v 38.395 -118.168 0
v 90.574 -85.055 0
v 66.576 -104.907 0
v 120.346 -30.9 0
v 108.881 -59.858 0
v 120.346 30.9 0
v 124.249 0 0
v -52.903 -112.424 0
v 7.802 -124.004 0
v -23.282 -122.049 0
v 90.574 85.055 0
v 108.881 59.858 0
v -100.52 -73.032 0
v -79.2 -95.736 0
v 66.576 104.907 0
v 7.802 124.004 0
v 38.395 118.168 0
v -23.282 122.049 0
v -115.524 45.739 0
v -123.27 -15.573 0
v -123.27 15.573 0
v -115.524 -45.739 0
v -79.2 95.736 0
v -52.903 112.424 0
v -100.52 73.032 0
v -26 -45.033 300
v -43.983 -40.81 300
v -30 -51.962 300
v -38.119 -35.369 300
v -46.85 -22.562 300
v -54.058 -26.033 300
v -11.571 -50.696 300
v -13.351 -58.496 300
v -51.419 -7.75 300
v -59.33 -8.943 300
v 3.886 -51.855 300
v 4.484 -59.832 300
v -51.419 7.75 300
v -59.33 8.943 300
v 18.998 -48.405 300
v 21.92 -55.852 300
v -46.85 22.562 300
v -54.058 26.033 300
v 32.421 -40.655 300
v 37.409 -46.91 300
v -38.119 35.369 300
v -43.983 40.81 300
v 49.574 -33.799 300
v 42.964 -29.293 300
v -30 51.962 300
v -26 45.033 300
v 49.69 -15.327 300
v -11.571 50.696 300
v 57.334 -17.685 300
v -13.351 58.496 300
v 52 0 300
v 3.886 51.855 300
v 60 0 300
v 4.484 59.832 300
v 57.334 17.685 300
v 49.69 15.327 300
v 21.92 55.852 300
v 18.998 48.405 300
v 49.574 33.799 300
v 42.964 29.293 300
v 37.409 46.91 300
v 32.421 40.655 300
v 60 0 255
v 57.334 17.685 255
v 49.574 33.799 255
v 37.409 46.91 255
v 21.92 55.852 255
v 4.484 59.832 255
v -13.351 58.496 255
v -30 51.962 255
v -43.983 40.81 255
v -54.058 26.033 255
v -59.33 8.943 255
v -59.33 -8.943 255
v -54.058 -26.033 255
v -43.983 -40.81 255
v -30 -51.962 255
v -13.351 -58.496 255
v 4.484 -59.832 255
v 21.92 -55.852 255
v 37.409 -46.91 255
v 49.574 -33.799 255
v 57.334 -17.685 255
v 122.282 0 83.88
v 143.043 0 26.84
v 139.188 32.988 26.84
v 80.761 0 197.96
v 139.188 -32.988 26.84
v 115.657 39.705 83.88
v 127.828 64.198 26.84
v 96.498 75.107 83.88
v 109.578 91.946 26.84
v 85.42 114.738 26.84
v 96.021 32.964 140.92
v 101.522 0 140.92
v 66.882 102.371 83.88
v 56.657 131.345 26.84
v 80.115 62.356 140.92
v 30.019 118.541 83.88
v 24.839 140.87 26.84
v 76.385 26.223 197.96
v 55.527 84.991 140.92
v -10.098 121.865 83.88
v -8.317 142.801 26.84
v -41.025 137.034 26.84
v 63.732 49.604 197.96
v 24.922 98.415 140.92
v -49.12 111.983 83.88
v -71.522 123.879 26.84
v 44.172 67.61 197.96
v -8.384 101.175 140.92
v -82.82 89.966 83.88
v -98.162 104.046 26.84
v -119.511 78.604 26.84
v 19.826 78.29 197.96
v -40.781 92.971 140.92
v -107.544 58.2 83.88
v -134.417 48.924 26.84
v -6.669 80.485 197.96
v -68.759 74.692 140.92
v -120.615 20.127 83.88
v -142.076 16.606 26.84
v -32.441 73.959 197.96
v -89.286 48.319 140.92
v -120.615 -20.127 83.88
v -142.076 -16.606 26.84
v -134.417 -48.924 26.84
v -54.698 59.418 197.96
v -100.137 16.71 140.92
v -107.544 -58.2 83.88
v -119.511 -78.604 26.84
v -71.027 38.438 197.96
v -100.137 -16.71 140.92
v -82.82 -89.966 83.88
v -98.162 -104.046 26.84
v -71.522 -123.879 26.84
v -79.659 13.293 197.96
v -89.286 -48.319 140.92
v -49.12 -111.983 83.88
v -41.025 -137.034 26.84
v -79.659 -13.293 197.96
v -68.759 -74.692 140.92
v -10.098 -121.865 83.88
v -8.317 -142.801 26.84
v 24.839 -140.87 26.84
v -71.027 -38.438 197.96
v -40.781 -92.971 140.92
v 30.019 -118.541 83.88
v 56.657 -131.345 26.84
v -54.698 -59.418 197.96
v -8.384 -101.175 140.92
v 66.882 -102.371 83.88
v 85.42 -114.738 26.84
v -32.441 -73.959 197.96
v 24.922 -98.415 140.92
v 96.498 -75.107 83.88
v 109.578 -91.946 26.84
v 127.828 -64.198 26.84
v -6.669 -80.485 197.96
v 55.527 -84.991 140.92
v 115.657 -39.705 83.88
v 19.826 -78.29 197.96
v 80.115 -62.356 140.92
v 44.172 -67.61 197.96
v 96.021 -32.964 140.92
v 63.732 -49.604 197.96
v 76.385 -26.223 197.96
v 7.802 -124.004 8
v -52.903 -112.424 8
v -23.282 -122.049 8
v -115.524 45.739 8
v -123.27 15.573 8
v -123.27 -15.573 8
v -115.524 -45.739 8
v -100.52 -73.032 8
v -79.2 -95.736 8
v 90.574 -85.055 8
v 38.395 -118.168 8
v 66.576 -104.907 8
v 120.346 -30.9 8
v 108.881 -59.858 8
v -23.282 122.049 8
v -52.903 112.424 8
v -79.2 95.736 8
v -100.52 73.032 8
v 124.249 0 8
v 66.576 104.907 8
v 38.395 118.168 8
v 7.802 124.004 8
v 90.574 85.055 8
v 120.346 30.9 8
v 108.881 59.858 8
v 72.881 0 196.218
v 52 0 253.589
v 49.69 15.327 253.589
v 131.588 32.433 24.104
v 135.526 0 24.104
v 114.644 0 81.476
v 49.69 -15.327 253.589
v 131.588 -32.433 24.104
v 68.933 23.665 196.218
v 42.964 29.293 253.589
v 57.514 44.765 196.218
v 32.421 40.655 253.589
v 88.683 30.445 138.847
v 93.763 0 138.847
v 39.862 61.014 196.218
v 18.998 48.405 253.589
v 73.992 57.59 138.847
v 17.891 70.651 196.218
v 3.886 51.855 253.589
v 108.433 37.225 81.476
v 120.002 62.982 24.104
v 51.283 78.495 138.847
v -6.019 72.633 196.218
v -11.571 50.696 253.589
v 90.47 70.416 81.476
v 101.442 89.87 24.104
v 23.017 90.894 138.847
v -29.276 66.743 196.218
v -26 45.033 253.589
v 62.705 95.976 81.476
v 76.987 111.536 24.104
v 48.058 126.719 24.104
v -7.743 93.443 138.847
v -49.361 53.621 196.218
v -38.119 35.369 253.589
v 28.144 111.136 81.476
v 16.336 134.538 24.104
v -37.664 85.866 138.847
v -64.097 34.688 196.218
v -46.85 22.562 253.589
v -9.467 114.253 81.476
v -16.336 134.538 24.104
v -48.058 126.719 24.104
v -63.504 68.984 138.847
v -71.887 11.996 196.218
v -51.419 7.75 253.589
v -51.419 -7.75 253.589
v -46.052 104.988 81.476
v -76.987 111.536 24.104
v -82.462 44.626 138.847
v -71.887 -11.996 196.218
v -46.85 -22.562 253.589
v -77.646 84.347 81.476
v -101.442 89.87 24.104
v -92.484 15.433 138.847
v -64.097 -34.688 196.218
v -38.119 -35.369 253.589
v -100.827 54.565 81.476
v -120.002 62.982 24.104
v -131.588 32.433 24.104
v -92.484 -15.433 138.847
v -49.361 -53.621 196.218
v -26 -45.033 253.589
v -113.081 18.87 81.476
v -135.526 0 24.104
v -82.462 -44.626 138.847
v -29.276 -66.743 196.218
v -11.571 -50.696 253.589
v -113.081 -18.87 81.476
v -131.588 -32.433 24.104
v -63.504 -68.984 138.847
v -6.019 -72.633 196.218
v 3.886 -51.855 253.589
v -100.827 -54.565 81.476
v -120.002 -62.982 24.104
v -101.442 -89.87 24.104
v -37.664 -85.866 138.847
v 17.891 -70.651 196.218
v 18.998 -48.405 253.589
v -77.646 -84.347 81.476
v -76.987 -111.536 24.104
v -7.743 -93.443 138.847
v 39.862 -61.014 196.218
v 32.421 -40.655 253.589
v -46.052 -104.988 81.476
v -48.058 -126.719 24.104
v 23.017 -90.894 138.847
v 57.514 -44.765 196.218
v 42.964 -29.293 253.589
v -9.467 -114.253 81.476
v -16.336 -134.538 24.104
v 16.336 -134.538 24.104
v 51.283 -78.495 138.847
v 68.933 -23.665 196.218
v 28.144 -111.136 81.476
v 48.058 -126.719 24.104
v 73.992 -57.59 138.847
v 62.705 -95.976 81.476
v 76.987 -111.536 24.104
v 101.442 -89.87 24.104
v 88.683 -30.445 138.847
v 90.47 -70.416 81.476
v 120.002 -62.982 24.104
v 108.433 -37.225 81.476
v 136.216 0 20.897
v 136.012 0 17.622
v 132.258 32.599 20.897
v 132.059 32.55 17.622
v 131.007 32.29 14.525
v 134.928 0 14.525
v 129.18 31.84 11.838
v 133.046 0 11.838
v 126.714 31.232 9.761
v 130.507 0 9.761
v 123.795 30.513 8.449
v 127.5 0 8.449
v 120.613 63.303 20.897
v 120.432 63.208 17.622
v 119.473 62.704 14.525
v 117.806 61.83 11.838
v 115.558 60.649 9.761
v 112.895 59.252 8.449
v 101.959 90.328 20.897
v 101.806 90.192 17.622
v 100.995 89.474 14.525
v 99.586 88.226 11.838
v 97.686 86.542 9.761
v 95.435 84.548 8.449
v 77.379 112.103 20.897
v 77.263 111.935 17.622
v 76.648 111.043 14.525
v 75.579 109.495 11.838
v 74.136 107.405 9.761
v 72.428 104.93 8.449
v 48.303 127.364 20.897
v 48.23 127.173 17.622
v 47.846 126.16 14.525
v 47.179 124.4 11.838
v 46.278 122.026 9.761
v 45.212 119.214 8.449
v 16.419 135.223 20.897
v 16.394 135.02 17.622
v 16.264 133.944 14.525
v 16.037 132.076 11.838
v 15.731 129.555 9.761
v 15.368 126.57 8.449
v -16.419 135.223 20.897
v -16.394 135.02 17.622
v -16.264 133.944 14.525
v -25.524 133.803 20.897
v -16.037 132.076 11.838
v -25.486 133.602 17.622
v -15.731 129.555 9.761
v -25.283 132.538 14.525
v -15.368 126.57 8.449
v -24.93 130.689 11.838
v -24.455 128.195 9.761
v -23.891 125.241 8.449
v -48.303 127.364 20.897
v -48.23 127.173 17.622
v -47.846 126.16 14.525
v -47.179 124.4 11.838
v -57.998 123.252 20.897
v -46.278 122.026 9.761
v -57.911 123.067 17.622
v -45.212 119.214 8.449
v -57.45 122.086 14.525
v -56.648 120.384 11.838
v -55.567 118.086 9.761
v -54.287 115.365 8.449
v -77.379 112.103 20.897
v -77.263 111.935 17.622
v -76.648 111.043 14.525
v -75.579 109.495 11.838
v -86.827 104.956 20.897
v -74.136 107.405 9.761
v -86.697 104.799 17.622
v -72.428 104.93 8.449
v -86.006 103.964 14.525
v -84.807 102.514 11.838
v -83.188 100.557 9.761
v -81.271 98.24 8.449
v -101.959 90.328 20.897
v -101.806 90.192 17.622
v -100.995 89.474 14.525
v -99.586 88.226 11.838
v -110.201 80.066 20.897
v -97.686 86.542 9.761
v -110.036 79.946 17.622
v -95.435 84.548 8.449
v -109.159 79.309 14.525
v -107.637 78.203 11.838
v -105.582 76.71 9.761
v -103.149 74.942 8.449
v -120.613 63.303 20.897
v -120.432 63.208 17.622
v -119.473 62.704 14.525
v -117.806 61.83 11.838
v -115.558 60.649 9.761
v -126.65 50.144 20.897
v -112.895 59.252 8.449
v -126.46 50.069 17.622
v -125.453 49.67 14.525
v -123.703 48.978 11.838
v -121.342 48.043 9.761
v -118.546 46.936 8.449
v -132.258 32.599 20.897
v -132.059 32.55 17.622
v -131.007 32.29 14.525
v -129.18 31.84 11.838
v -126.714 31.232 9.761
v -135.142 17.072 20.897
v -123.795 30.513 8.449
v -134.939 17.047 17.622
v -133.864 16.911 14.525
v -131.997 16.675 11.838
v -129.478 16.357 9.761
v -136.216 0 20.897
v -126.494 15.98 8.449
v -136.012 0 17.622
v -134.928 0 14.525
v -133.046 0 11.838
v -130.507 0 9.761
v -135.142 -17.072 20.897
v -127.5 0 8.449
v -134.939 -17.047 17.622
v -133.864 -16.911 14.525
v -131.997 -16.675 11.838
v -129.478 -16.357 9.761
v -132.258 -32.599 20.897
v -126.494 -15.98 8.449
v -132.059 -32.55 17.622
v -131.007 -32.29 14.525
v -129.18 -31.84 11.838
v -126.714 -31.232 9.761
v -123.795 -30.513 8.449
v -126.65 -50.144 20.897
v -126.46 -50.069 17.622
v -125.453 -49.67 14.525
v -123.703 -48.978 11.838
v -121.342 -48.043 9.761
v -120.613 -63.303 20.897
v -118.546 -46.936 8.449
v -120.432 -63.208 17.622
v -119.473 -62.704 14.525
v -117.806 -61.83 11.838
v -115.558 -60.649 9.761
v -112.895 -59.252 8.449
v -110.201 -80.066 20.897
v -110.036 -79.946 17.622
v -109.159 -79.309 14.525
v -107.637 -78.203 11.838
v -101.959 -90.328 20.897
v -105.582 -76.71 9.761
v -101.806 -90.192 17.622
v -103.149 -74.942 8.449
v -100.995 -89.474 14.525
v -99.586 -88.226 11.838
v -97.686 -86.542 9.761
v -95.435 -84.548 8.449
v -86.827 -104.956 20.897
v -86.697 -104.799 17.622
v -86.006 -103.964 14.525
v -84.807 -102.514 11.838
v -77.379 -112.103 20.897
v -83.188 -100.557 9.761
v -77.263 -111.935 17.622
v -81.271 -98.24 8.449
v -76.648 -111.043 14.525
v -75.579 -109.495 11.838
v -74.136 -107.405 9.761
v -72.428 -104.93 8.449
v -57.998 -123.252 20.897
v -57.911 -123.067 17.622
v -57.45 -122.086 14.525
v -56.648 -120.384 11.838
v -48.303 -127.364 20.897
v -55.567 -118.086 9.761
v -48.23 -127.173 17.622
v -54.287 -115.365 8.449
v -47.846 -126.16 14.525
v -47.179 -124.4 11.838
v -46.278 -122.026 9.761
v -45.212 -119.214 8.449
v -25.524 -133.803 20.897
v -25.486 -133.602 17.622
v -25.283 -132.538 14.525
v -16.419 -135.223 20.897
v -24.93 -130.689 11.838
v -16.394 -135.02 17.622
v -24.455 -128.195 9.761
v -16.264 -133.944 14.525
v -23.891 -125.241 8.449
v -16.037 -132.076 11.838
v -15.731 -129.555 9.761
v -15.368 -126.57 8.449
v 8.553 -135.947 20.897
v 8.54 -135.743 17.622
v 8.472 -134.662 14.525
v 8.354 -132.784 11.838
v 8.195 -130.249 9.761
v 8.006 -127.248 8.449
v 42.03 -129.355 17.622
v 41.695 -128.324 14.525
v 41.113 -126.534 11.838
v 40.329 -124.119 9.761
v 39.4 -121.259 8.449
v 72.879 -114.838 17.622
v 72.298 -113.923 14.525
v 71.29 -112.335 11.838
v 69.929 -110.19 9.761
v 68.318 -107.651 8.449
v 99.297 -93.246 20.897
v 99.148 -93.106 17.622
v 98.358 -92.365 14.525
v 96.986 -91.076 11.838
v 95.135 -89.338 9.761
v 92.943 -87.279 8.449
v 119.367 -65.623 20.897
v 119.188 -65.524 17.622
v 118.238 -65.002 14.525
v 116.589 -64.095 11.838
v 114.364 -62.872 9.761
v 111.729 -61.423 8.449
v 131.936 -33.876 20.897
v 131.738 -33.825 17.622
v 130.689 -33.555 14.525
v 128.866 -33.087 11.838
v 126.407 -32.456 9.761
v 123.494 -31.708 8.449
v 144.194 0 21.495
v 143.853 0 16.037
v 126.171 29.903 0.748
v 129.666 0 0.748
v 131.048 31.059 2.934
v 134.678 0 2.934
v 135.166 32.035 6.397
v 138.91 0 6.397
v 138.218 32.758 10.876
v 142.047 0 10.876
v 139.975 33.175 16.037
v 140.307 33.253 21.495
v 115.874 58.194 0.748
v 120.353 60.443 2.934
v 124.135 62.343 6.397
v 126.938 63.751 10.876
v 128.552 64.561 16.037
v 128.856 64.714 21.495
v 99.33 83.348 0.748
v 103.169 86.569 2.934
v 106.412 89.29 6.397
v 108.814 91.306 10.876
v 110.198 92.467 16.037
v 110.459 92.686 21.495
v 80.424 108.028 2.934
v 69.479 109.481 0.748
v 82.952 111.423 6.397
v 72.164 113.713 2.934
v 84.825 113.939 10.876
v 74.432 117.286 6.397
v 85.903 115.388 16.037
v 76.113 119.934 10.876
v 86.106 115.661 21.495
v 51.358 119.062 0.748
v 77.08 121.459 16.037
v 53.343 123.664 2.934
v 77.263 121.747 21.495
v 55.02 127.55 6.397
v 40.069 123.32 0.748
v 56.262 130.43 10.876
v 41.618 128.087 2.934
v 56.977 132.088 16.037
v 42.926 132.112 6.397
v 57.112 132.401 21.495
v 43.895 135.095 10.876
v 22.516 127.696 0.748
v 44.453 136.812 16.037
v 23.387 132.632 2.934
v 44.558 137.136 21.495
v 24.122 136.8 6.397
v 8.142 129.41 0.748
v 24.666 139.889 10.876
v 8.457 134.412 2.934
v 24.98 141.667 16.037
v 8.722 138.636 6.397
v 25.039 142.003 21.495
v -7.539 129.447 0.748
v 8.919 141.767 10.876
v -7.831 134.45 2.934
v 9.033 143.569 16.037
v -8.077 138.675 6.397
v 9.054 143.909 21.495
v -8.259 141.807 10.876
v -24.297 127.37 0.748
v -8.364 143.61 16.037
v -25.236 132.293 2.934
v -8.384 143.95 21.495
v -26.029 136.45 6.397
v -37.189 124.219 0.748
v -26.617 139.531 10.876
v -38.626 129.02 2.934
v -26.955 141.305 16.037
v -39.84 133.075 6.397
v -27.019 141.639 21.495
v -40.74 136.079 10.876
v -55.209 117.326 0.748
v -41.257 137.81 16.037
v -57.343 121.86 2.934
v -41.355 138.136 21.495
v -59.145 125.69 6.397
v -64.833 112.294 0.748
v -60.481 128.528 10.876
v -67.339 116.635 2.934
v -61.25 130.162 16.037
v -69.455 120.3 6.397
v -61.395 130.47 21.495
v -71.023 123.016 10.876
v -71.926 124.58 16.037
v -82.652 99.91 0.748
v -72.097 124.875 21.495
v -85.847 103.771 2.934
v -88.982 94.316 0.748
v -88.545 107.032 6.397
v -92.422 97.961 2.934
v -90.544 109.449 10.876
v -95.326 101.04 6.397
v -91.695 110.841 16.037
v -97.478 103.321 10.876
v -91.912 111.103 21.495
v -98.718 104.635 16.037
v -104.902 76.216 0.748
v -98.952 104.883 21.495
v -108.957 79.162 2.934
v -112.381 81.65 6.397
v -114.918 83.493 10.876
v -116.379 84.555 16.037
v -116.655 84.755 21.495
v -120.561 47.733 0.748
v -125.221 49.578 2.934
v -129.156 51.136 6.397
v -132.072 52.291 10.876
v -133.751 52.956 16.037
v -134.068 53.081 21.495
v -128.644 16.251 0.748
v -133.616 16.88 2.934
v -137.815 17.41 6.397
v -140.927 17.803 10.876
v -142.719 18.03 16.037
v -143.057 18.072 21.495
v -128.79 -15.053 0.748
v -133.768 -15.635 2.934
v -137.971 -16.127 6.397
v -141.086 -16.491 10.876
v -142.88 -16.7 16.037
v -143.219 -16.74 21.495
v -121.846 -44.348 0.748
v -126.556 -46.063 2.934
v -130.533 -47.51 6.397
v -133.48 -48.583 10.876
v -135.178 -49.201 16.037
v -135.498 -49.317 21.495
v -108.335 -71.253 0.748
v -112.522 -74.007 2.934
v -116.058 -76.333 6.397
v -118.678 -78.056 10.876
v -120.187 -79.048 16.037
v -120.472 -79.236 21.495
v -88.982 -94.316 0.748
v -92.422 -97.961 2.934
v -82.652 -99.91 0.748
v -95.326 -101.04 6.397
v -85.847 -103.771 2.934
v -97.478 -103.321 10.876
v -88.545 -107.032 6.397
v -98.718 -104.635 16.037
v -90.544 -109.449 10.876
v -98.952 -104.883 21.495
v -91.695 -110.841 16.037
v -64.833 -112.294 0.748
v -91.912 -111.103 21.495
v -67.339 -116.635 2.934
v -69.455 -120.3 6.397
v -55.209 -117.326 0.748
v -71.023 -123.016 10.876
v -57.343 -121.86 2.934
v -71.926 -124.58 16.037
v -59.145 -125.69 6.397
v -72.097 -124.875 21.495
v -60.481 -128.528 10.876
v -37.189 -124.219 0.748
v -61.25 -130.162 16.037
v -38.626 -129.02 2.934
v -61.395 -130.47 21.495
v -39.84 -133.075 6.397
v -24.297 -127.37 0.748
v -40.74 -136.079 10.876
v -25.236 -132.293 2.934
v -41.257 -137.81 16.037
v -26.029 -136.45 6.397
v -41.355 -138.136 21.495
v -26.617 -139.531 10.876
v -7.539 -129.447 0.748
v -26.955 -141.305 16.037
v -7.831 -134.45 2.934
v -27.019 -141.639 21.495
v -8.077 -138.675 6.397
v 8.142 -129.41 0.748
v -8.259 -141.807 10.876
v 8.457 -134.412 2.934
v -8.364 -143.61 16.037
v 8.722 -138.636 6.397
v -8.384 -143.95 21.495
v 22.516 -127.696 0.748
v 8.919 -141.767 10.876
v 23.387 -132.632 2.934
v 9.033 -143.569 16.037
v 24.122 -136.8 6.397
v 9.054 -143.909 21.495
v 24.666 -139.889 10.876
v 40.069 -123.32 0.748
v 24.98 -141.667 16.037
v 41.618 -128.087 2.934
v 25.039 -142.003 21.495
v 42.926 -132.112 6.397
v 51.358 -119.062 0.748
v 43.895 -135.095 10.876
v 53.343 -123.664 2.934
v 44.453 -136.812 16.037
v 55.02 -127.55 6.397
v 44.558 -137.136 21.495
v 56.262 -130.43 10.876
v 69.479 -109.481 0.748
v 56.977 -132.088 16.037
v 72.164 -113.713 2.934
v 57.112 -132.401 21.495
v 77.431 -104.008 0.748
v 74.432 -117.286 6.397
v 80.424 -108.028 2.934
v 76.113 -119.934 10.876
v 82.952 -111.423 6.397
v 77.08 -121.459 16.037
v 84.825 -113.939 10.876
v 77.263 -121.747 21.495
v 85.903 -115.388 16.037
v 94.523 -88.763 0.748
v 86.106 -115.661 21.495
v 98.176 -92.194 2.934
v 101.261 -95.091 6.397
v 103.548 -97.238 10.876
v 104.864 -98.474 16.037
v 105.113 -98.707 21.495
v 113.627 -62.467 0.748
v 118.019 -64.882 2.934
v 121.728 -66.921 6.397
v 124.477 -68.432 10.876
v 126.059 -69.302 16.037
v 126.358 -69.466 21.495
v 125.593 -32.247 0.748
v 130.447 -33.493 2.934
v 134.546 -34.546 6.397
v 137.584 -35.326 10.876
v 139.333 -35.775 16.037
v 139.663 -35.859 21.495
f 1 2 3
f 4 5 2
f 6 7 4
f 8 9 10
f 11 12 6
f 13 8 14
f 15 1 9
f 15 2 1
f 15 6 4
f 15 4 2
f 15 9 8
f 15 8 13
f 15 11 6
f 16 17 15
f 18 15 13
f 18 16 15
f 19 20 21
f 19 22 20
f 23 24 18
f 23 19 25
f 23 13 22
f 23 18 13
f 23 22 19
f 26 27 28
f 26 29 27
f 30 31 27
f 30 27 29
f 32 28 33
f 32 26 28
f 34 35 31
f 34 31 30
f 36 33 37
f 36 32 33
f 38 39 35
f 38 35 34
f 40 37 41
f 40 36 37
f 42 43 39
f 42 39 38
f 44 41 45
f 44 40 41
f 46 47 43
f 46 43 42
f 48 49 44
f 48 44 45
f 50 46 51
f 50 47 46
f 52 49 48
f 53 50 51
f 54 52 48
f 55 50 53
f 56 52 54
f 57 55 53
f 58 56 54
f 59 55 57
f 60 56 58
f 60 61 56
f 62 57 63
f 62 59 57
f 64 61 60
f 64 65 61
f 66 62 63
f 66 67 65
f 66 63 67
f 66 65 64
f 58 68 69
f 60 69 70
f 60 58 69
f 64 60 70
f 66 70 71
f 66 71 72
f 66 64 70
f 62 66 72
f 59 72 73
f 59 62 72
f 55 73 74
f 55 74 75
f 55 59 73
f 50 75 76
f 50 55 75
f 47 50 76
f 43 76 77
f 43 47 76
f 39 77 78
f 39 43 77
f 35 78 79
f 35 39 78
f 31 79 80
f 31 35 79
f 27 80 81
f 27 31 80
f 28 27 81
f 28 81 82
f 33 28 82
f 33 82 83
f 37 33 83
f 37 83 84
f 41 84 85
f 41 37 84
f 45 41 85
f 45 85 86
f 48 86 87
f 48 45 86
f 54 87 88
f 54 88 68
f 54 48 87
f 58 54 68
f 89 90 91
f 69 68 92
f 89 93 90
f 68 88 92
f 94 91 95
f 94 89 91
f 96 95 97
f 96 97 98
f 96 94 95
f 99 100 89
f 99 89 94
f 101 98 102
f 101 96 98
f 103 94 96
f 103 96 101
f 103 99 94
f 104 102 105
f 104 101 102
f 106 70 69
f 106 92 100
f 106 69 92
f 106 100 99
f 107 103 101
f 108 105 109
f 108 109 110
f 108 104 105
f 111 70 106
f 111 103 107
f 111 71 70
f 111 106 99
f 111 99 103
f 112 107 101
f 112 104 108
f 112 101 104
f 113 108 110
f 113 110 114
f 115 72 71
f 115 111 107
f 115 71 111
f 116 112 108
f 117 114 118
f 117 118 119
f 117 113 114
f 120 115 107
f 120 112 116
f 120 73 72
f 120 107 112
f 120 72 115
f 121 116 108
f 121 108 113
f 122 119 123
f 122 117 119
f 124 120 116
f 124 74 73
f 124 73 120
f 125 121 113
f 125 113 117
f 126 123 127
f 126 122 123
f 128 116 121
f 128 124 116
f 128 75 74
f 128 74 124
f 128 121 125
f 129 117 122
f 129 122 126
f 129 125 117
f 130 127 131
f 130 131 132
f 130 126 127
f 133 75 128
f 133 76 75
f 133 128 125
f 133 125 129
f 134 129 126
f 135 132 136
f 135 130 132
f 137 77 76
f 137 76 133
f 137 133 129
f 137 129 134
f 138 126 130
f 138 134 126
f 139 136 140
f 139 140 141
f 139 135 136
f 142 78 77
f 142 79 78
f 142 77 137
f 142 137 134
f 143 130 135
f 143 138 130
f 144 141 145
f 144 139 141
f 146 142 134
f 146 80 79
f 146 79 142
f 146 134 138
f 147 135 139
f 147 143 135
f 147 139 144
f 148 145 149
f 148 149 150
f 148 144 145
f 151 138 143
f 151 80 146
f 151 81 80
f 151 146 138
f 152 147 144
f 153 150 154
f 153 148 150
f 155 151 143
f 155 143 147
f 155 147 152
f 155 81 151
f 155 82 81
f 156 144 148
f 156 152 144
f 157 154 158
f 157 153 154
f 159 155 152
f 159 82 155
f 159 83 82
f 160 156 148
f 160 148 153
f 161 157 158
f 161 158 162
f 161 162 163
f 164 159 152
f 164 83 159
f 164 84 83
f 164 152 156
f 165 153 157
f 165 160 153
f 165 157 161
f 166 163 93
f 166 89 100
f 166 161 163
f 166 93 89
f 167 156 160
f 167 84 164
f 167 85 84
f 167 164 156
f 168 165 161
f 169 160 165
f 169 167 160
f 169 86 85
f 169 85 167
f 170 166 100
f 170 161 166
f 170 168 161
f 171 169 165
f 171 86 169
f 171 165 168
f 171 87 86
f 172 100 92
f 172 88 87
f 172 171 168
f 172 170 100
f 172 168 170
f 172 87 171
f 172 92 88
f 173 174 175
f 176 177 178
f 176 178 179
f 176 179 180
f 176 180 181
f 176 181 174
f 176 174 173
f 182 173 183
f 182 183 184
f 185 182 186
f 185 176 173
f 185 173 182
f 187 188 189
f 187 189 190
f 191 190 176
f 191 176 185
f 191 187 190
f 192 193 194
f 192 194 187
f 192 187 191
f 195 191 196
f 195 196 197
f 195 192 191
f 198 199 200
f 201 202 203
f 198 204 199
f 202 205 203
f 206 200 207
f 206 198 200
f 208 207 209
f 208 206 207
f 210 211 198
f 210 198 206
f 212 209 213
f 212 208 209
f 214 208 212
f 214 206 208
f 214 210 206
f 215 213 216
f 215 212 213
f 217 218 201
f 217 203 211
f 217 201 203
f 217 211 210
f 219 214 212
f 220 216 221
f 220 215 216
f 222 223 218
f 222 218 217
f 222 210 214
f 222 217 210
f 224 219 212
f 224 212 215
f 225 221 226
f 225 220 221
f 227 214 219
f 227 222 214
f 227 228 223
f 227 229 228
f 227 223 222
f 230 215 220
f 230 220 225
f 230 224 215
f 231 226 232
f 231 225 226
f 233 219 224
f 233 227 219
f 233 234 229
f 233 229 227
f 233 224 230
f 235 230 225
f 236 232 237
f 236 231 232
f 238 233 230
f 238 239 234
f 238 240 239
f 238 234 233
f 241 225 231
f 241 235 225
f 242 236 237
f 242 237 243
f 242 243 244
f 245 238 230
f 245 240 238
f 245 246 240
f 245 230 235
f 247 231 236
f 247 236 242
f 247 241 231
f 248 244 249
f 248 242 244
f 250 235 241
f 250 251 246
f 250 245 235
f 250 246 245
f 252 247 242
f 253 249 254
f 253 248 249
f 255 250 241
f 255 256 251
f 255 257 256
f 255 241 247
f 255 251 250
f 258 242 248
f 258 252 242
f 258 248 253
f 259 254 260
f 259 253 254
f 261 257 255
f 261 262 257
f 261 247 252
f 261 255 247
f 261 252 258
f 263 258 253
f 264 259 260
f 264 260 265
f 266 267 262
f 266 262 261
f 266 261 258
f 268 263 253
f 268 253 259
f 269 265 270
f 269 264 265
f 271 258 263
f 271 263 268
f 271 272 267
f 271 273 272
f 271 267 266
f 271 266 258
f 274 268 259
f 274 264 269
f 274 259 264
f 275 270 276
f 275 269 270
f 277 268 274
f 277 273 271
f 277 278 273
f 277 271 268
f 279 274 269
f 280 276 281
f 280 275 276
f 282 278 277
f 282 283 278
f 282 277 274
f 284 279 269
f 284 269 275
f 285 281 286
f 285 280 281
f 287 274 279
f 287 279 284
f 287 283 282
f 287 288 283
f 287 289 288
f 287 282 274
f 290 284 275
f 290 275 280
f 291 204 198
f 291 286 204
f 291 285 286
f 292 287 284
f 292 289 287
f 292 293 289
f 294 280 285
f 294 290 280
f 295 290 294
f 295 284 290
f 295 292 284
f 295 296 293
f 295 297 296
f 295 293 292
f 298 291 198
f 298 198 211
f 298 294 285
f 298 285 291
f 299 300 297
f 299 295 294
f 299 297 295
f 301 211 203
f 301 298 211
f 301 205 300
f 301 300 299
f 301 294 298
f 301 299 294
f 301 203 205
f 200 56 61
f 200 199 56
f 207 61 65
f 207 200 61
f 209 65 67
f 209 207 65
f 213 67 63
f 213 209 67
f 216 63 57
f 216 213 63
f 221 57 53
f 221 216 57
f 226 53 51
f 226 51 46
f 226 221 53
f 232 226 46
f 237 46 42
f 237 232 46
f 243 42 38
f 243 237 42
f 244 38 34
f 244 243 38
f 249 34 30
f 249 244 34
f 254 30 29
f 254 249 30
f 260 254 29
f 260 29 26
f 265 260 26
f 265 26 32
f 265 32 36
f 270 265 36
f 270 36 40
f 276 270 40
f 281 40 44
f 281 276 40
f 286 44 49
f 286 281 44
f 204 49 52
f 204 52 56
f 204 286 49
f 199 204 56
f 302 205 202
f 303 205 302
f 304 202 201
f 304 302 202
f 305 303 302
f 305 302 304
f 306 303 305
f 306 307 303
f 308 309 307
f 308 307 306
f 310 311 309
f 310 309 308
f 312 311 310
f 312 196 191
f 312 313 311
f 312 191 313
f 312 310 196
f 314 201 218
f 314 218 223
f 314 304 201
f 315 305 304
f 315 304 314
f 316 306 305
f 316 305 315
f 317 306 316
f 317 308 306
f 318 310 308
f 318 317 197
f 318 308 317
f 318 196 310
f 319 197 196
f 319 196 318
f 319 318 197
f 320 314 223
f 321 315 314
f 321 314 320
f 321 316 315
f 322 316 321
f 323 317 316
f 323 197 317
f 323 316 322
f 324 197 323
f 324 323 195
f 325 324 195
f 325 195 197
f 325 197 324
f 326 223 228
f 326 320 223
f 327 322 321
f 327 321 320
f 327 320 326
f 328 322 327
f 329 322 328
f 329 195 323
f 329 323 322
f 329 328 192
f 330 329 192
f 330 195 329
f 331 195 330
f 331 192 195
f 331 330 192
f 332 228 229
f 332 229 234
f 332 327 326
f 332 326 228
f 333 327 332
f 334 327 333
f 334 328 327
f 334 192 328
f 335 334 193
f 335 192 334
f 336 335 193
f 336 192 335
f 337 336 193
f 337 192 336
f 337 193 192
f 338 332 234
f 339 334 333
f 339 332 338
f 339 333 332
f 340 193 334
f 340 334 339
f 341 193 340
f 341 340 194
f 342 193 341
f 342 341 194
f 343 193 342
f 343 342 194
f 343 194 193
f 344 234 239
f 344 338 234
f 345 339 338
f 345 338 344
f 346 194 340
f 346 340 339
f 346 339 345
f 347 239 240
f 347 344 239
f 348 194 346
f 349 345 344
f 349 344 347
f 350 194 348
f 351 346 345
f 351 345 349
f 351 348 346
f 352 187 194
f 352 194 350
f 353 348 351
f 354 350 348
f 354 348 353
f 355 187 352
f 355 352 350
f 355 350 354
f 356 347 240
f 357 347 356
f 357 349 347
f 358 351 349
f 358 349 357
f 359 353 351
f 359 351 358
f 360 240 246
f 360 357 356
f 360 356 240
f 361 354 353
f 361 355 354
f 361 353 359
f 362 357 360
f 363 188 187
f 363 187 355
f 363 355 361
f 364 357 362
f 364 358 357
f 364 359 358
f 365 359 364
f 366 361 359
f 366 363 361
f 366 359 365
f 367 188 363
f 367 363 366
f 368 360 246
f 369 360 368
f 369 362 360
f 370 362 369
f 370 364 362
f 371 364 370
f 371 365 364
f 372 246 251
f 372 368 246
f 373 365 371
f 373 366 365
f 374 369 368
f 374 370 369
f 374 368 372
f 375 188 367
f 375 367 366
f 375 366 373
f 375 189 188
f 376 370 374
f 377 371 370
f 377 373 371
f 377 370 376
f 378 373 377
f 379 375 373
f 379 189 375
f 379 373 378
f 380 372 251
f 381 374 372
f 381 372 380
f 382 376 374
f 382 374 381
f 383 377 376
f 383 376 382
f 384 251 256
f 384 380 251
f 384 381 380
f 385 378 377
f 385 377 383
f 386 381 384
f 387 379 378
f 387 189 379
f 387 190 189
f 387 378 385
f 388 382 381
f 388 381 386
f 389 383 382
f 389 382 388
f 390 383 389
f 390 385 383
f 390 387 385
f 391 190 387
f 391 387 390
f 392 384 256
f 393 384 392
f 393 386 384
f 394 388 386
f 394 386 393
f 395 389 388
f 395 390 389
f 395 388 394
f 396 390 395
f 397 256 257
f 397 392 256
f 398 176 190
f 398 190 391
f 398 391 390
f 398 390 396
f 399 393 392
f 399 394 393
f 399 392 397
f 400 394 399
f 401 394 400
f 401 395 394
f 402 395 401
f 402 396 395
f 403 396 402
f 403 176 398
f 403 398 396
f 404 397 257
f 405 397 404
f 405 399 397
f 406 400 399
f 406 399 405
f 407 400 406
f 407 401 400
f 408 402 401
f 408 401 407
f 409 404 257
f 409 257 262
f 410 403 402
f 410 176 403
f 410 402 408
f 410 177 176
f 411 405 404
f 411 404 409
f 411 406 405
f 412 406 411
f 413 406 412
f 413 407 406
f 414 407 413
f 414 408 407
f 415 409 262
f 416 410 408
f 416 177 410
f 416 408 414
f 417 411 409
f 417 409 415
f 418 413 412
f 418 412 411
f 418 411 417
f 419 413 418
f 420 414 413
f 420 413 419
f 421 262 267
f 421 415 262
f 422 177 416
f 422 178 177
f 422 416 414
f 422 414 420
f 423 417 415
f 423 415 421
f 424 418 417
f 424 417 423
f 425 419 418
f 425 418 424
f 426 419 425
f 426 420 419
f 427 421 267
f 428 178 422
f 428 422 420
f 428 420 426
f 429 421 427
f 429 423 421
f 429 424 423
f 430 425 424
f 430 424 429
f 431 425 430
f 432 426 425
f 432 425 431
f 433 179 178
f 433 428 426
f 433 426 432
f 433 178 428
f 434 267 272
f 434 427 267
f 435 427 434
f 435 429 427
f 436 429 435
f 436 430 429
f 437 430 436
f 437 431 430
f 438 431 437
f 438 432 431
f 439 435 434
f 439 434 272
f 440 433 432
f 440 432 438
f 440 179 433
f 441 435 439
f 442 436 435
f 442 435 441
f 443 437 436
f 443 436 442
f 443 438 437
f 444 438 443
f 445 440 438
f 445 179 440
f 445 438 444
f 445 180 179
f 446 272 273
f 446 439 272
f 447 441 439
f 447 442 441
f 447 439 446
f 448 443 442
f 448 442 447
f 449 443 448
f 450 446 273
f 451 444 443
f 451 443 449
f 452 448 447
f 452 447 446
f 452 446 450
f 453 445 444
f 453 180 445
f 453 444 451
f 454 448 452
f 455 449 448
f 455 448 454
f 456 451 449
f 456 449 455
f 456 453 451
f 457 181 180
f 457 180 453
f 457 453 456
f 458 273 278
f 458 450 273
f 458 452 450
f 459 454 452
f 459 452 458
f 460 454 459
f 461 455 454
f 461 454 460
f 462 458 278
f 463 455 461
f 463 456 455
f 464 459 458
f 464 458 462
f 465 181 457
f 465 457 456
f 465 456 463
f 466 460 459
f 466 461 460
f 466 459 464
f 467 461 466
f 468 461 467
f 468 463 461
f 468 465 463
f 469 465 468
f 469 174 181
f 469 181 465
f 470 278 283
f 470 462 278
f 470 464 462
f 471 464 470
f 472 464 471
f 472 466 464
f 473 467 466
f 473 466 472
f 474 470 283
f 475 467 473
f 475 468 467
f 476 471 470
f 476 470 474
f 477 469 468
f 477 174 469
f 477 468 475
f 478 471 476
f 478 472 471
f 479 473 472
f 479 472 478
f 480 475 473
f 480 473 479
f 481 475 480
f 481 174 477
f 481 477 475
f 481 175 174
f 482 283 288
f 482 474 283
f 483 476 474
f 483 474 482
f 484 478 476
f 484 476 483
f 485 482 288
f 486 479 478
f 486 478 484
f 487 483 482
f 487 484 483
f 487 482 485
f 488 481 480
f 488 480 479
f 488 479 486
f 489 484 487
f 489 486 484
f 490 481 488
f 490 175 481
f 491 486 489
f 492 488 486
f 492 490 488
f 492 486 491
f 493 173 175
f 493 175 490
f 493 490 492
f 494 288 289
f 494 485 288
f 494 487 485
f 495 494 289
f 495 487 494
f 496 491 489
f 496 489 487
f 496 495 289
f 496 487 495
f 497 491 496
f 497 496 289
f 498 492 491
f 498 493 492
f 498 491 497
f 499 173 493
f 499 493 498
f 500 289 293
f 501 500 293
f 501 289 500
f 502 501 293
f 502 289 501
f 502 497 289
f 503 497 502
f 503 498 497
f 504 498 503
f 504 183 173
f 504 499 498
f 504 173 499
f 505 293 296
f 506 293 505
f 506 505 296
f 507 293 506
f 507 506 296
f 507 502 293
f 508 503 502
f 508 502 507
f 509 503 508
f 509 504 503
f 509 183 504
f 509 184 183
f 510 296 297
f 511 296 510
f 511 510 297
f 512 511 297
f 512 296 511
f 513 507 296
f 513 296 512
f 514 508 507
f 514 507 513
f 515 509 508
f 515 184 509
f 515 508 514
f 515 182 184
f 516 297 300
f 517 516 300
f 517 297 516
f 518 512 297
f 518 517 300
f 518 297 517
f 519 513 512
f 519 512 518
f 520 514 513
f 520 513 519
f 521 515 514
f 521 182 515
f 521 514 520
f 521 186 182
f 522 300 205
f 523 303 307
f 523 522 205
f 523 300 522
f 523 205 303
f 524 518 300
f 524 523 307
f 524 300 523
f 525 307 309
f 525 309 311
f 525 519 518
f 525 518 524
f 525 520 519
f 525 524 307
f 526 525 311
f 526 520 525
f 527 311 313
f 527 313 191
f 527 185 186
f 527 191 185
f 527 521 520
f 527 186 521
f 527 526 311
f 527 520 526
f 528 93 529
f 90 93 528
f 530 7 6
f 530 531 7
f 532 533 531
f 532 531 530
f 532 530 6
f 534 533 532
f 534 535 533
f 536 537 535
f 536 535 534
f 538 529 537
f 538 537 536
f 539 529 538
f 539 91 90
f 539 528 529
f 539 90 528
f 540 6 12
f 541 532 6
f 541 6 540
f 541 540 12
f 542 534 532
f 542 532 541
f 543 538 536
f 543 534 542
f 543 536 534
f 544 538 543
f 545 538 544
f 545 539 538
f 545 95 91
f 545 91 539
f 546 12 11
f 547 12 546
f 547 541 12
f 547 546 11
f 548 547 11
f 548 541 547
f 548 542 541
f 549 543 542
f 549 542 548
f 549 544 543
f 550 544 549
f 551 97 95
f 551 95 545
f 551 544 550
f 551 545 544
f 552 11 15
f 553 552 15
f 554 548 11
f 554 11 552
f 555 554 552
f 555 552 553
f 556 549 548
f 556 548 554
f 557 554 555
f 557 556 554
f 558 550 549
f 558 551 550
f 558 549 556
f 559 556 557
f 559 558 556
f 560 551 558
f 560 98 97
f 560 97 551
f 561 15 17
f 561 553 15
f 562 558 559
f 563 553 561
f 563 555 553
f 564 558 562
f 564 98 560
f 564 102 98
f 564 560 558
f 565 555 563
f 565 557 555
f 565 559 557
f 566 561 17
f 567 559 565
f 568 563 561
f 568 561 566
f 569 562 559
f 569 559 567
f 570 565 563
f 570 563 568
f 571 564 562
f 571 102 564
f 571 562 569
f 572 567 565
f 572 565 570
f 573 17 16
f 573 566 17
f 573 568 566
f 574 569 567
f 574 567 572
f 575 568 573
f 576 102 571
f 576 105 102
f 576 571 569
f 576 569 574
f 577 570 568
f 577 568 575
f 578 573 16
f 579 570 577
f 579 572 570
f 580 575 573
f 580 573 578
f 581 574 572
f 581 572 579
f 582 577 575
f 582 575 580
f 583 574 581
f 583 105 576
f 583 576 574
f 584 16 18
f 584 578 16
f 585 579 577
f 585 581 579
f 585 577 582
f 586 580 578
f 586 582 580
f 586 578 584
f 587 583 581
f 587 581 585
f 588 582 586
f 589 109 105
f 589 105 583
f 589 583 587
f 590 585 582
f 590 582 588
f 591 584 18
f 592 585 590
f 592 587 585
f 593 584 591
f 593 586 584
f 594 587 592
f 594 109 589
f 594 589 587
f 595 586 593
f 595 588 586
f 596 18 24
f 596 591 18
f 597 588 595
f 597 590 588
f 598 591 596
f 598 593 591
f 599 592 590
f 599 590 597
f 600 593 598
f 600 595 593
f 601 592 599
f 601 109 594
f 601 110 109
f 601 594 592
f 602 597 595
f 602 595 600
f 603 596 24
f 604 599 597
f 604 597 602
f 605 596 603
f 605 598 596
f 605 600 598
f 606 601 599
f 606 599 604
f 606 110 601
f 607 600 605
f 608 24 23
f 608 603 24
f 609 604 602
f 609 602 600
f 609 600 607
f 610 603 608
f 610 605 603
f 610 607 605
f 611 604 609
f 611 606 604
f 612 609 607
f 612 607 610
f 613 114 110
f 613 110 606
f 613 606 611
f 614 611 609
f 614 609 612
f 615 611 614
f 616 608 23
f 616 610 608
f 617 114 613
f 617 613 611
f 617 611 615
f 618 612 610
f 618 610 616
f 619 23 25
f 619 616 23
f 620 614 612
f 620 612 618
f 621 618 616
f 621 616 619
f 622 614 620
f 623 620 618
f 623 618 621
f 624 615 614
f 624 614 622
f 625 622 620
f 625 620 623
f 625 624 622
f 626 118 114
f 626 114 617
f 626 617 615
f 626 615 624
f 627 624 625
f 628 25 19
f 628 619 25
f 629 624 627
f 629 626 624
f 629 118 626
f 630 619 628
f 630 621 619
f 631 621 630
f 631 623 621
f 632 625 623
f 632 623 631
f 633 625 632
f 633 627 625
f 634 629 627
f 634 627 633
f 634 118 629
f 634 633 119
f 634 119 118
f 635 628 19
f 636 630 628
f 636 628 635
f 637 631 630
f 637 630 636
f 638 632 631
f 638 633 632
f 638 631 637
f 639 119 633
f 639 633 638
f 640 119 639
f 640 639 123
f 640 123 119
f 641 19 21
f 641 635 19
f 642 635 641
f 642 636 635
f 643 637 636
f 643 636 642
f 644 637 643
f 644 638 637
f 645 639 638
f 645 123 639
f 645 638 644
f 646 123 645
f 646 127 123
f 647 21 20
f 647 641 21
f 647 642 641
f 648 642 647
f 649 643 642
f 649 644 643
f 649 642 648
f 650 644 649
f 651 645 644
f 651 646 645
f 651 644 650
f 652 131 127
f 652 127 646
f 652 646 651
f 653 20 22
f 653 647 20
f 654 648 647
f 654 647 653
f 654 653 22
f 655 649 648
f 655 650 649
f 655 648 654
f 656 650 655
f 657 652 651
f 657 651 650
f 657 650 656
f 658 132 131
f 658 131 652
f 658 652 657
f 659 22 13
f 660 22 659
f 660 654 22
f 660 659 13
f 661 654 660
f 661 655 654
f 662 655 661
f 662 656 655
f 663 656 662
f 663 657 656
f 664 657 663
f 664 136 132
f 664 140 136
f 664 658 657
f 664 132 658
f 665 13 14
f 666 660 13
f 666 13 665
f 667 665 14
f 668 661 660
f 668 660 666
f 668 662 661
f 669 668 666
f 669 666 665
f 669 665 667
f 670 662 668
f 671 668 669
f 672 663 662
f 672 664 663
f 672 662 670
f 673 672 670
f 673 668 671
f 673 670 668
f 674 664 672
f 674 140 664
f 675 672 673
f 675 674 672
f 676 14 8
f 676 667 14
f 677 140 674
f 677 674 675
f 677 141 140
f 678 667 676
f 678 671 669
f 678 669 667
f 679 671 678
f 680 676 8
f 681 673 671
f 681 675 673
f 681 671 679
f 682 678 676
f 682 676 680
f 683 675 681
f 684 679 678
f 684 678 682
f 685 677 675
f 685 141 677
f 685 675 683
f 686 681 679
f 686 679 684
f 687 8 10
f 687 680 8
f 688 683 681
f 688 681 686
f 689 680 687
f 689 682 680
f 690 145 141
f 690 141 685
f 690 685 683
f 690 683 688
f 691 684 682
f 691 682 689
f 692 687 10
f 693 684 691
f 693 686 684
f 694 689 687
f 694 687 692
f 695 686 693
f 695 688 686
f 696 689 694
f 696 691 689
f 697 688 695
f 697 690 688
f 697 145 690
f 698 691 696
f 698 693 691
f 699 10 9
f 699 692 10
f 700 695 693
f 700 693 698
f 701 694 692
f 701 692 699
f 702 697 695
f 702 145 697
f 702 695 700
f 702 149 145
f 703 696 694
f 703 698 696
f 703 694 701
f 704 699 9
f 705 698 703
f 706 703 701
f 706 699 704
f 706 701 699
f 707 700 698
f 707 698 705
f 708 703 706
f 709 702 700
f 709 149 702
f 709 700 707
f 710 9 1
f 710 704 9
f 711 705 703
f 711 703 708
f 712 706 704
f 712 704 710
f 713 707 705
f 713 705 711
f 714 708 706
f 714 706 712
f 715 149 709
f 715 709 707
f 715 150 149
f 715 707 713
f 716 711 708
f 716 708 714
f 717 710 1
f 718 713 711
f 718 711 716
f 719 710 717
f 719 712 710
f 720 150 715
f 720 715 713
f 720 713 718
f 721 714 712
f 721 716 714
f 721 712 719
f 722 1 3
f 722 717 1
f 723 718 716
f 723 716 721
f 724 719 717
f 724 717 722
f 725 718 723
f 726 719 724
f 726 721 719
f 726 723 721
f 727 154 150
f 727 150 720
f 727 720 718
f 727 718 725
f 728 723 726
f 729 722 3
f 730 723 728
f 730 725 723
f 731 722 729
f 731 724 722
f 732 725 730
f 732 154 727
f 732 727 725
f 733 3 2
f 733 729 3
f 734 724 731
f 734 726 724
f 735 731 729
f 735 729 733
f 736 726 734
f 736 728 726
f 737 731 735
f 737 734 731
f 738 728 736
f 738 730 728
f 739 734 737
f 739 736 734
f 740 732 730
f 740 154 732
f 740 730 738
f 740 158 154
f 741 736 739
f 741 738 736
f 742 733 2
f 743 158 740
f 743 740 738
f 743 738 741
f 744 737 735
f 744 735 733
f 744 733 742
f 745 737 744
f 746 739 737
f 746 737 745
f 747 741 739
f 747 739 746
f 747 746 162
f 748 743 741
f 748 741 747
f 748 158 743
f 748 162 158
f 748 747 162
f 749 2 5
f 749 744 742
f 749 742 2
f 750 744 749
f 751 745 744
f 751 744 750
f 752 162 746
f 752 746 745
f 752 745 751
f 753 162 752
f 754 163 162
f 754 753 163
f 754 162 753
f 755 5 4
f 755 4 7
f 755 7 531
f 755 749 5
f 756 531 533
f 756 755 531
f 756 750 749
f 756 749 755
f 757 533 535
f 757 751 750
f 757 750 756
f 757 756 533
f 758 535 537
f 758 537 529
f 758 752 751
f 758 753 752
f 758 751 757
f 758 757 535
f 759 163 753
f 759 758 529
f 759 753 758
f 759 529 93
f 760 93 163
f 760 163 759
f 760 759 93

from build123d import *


with BuildPart() as f1:
    # F0 (on Front) → F1 (revolve)
    with BuildSketch(Plane.XZ):
        with BuildLine():
            Line((0, 8), (0, 0))
            Line((0, 0), (124.24945, 0))
            ThreePointArc((124.24945, 0), (140.63249, 8.528471), (143.043302, 26.840403))
            Line((143.043302, 26.840403), (60, 255))
            Line((60, 255), (60, 300))
            Line((60, 300), (52, 300))
            Line((52, 300), (52, 253.589384))
            Line((52, 253.589384), (135.525761, 24.104242))
            ThreePointArc((135.525761, 24.104242), (134.079274, 13.117083), (124.24945, 8))
            Line((124.24945, 8), (0, 8))
        make_face()
    revolve(axis=Axis((0, 0, 4), (0, 0, 1)))


solid = f1.part
